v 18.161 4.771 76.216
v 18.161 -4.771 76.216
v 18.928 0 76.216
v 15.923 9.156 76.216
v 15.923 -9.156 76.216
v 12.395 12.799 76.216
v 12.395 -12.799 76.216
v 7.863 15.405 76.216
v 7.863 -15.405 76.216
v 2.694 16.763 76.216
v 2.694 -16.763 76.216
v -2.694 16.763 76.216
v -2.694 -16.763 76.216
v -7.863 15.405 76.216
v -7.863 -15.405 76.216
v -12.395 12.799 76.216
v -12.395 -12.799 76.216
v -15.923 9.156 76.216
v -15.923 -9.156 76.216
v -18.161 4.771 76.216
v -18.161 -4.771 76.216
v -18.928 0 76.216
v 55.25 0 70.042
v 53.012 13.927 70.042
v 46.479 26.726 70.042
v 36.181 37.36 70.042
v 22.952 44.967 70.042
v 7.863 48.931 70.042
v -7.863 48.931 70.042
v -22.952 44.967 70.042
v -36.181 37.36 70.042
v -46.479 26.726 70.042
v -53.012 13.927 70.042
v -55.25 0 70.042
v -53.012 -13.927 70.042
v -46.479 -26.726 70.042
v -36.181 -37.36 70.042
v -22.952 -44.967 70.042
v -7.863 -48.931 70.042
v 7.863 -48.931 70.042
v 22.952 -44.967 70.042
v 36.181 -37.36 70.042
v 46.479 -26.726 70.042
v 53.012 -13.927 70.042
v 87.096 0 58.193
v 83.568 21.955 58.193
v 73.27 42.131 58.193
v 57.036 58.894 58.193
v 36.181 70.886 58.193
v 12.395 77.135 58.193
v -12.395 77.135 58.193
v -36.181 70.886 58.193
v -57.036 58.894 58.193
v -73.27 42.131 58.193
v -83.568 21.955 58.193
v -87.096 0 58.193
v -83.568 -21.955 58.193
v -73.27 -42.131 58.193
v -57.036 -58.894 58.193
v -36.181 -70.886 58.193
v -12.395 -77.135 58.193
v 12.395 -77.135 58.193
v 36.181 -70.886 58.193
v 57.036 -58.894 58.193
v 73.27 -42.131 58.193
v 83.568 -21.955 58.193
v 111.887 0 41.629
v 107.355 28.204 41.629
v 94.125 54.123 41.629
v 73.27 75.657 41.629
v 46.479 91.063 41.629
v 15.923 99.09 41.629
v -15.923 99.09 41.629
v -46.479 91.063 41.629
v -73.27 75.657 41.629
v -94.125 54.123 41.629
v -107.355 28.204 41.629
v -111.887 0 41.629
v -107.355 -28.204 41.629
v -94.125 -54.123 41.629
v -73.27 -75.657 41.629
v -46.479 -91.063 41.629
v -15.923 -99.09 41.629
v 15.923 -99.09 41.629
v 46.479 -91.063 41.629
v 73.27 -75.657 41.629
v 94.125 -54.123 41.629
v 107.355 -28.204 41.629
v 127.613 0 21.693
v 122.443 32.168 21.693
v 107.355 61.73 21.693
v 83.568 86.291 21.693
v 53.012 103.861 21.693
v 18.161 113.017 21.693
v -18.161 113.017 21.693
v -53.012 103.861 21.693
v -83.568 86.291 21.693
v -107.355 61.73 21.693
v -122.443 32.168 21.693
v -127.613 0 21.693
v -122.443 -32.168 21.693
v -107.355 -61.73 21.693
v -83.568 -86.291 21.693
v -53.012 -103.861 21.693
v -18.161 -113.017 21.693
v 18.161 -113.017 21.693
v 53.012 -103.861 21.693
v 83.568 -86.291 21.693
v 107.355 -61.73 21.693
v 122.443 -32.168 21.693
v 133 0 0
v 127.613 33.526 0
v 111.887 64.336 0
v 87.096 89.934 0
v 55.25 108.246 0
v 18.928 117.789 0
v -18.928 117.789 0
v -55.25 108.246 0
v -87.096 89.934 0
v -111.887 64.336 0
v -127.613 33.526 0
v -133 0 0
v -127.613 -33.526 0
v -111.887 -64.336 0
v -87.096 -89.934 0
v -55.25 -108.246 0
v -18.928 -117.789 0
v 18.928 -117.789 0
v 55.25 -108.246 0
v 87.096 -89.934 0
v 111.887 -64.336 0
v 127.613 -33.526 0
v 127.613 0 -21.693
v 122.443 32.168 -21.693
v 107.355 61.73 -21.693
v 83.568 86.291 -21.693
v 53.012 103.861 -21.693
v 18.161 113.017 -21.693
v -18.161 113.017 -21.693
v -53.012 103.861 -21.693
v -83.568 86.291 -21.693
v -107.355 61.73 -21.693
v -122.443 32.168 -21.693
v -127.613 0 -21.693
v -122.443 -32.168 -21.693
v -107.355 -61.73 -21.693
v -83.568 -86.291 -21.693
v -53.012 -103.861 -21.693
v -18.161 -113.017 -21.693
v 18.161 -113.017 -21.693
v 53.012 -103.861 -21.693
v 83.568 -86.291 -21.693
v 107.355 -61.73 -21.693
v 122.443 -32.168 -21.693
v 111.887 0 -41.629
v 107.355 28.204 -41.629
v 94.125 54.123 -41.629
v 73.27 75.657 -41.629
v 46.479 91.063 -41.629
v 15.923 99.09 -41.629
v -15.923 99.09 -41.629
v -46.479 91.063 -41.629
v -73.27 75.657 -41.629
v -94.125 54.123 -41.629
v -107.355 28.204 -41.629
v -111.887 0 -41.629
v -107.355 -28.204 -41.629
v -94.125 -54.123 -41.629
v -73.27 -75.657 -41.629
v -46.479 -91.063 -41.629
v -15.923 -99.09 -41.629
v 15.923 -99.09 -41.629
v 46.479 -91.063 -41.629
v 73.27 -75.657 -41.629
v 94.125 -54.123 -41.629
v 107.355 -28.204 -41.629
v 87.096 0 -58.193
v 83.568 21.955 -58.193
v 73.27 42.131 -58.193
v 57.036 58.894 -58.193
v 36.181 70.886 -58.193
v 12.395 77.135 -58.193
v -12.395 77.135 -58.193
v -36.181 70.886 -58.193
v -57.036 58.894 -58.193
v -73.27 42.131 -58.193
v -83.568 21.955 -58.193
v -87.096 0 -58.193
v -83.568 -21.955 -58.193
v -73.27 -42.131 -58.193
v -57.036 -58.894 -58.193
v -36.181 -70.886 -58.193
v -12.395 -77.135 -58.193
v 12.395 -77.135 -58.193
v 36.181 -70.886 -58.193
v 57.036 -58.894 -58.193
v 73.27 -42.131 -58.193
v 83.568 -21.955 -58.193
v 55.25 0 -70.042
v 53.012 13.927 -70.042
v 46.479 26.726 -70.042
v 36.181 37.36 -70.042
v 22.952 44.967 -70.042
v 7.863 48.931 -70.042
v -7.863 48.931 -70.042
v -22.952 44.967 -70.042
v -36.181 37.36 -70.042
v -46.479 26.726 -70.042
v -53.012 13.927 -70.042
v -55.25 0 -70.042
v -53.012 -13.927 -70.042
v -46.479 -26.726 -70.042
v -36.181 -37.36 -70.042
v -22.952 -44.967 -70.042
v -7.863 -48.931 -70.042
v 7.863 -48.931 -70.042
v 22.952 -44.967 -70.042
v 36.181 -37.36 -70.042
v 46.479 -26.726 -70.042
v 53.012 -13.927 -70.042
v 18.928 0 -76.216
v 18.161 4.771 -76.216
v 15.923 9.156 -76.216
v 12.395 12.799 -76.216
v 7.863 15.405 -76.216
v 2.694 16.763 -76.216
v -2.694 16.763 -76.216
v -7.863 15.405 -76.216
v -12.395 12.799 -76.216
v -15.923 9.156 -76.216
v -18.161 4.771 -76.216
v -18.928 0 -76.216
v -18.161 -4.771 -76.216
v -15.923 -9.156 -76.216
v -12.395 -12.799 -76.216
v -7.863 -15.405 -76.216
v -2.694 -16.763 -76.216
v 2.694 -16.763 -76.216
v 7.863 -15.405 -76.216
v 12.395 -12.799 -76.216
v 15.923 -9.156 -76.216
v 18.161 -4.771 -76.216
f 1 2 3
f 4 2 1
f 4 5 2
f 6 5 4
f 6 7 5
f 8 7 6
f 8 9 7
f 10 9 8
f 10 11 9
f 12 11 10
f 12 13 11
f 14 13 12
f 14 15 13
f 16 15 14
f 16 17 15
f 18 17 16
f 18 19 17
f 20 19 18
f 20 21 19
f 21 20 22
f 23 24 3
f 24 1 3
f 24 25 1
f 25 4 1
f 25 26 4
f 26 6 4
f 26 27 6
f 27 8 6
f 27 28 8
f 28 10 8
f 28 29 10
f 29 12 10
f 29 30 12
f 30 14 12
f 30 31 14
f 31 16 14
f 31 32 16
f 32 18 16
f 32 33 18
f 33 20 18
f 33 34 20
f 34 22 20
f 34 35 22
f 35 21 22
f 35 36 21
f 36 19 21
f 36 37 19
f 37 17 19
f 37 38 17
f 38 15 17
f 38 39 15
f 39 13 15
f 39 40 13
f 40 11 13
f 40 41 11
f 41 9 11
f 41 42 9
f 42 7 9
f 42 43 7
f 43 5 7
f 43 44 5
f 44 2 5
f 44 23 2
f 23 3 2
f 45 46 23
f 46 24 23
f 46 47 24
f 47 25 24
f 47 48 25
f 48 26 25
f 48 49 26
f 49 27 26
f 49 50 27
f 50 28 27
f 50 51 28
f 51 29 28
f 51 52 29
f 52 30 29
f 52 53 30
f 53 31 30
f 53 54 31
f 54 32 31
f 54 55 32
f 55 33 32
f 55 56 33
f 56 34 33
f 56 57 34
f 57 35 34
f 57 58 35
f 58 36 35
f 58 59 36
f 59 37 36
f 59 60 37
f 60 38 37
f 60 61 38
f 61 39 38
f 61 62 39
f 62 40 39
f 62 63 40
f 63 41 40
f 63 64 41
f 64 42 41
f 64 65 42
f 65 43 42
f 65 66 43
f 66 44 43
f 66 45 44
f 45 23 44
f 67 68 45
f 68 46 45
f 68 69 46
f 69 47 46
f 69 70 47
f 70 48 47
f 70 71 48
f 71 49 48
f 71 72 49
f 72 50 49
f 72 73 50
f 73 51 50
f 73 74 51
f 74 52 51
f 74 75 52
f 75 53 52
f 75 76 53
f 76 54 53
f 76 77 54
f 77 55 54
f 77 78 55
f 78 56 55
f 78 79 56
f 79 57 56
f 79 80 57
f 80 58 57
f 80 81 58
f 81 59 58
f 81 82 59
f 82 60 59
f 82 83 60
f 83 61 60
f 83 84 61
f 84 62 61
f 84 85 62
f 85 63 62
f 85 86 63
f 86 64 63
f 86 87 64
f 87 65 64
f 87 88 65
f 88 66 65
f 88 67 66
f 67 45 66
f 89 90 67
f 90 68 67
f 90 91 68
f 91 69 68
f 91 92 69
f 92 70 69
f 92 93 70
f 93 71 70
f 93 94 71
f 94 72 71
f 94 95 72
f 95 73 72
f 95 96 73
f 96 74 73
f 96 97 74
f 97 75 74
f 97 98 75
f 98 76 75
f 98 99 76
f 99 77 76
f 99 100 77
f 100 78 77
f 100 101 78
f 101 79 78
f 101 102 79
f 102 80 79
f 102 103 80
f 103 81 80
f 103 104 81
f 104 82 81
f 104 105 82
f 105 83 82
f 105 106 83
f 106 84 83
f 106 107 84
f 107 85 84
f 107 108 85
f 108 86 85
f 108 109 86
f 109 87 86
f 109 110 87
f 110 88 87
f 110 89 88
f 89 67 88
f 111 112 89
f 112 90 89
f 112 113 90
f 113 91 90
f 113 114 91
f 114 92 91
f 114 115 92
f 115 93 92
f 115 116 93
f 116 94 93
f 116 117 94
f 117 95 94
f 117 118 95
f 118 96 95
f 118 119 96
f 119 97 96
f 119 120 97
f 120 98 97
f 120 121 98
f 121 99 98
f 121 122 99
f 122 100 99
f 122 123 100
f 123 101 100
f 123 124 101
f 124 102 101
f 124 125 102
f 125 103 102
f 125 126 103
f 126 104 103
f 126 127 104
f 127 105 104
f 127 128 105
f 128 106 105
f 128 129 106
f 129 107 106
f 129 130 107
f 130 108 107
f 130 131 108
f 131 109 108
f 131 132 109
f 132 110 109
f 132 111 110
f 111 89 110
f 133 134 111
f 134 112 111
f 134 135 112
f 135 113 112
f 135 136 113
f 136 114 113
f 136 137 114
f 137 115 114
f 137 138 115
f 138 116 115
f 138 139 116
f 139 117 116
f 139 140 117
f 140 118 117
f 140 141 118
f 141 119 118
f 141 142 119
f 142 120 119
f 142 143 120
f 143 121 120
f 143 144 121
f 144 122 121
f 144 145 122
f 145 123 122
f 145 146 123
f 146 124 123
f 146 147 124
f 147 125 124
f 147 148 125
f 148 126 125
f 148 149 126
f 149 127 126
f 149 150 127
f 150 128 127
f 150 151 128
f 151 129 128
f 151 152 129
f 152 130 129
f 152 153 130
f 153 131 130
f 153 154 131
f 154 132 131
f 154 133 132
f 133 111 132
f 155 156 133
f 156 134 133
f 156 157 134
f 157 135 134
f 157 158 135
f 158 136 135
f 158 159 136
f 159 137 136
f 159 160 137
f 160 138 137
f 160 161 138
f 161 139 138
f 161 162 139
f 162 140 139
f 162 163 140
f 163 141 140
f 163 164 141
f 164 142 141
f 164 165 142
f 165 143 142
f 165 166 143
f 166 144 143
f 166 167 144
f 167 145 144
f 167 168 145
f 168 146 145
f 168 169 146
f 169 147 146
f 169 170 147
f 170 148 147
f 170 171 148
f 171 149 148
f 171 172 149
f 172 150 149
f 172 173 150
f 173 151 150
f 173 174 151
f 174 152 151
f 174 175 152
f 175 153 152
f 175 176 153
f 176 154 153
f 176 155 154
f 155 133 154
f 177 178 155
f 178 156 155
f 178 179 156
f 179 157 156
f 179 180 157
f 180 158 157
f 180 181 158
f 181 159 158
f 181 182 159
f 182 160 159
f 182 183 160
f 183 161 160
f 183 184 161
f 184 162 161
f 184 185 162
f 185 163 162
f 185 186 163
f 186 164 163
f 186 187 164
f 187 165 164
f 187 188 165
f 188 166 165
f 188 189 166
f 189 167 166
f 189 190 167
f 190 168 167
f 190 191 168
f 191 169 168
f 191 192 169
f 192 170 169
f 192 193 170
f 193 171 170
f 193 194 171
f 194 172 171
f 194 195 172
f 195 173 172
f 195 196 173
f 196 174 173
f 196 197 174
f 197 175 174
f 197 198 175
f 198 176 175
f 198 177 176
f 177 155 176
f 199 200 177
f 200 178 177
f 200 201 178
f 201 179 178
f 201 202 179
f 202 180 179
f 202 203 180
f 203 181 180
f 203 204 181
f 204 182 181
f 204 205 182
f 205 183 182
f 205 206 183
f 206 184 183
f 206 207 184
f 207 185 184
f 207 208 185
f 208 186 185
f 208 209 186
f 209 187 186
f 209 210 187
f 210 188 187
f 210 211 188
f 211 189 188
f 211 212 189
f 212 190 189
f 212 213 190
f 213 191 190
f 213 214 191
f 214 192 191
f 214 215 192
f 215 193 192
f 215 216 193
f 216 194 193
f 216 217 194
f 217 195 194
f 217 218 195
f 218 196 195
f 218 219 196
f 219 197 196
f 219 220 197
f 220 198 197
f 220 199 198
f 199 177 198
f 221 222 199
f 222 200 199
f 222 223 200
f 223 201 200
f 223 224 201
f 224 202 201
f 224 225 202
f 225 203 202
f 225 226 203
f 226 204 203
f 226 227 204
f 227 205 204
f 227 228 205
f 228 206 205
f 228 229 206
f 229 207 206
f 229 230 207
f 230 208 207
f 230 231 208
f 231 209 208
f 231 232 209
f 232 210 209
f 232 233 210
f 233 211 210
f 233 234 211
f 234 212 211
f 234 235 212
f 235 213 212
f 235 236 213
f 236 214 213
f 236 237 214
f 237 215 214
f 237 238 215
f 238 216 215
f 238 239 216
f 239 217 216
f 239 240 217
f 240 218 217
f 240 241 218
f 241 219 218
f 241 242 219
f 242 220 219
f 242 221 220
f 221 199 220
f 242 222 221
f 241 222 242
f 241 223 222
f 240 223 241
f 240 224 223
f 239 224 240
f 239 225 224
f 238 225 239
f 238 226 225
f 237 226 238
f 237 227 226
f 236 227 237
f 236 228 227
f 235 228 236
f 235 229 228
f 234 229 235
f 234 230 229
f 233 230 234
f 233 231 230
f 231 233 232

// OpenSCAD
// Generated by SolidPython 1.0.1 on 2020-07-29 00:46:54


scale(v = [19, 17, 11]) {
	sphere(r = 7);
}
/***********************************************
*********      SolidPython code:      **********
************************************************
 
# import packages: SolidPython
from solid import *
from solid.utils import *
from itertools import chain, combinations, permutations


class Resize:

    def __init__(self, scad_file):
        self.scad_file = scad_file
        #self.scad_file = import_scad(scad_file)
        # cone/cylinder param:
        self.r1 = 0
        self.r2 = 0
        self.h = 0
        # rectangular prism param:
        self.w = 0
        self.l = 0
        # ellipse param:
        self.r = 0

    # import OpenScad code (file name corresponds to shape)


    # classify shape + parameters
    def assign(self, param1, param2, param3):
        if self.scad_file == 'cone.scad':
            self.r1 = param1
            self.r2 = param2
            self.h = param3
        elif self.scad_file == 'cylinder.scad':
            self.r1 = param1
            self.r2 = param2
            self.h = param3
        elif self.scad_file == 'rectangularPrism.scad':
            self.h = param1
            self.l = param2
            self.w = param3
        else:
            self.r = param1
            self.h = param2

    # resize parameters
    def iterate(self):
        x = range(3, 20, 2)
        i = 1
        if self.scad_file == 'cone.scad':
            tempList = list(permutations(x, 2))
            for temp in tempList:
                param1 = temp[0]
                param2 = temp[1]
                filepath = 'produced_scad_files/' + 'cone' + str(param1) + '_' + str(param2) + '_' + '.scad'
                scad_render_to_file(cylinder(h=param1, r1=param2, r2=0), filepath)

        elif self.scad_file == 'cylinder.scad':
            tempList = list(permutations(x, 3))
            for temp in tempList:
                param1 = temp[0]
                param2 = temp[1]
                filepath = 'produced_scad_files/' + 'cylinder' + str(param1) + '_' + str(param2) + '_' + '.scad'
                scad_render_to_file(cylinder(h=param1, r1=param2, r2=param2), filepath)

        elif self.scad_file == 'rectangularPrism.scad':
            tempList = list(permutations(x, 3))
            for temp in tempList:
                param1 = temp[0]
                param2 = temp[1]
                param3 = temp[2]
                filepath = 'produced_scad_files/' + 'rectangularPrism' + str(param1) + '_' + str(param2) + '_' + str(
                    param3) + '.scad'
                scad_render_to_file(cube(size=(param1, param2, param3)), filepath)

        elif self.scad_file == 'ellipse.scad':
            tempList = list(permutations(x, 4))
            for temp in tempList:
                param1 = temp[0]
                param2 = temp[1]
                param3 = temp[2]
                param4 = temp[3]
                filepath = 'produced_scad_files/' + 'ellipse' + str(param1) + '_' + str(param2) + '_' + str(param3) + '_' + str(param4) + '.scad'
                scad_render_to_file(scale([param1, param2, param3])(sphere(r=param4)), filepath)

    def render_to_scadfile(self):
        scad_render_to_file(scad, 'example.scad') 
 
************************************************/
